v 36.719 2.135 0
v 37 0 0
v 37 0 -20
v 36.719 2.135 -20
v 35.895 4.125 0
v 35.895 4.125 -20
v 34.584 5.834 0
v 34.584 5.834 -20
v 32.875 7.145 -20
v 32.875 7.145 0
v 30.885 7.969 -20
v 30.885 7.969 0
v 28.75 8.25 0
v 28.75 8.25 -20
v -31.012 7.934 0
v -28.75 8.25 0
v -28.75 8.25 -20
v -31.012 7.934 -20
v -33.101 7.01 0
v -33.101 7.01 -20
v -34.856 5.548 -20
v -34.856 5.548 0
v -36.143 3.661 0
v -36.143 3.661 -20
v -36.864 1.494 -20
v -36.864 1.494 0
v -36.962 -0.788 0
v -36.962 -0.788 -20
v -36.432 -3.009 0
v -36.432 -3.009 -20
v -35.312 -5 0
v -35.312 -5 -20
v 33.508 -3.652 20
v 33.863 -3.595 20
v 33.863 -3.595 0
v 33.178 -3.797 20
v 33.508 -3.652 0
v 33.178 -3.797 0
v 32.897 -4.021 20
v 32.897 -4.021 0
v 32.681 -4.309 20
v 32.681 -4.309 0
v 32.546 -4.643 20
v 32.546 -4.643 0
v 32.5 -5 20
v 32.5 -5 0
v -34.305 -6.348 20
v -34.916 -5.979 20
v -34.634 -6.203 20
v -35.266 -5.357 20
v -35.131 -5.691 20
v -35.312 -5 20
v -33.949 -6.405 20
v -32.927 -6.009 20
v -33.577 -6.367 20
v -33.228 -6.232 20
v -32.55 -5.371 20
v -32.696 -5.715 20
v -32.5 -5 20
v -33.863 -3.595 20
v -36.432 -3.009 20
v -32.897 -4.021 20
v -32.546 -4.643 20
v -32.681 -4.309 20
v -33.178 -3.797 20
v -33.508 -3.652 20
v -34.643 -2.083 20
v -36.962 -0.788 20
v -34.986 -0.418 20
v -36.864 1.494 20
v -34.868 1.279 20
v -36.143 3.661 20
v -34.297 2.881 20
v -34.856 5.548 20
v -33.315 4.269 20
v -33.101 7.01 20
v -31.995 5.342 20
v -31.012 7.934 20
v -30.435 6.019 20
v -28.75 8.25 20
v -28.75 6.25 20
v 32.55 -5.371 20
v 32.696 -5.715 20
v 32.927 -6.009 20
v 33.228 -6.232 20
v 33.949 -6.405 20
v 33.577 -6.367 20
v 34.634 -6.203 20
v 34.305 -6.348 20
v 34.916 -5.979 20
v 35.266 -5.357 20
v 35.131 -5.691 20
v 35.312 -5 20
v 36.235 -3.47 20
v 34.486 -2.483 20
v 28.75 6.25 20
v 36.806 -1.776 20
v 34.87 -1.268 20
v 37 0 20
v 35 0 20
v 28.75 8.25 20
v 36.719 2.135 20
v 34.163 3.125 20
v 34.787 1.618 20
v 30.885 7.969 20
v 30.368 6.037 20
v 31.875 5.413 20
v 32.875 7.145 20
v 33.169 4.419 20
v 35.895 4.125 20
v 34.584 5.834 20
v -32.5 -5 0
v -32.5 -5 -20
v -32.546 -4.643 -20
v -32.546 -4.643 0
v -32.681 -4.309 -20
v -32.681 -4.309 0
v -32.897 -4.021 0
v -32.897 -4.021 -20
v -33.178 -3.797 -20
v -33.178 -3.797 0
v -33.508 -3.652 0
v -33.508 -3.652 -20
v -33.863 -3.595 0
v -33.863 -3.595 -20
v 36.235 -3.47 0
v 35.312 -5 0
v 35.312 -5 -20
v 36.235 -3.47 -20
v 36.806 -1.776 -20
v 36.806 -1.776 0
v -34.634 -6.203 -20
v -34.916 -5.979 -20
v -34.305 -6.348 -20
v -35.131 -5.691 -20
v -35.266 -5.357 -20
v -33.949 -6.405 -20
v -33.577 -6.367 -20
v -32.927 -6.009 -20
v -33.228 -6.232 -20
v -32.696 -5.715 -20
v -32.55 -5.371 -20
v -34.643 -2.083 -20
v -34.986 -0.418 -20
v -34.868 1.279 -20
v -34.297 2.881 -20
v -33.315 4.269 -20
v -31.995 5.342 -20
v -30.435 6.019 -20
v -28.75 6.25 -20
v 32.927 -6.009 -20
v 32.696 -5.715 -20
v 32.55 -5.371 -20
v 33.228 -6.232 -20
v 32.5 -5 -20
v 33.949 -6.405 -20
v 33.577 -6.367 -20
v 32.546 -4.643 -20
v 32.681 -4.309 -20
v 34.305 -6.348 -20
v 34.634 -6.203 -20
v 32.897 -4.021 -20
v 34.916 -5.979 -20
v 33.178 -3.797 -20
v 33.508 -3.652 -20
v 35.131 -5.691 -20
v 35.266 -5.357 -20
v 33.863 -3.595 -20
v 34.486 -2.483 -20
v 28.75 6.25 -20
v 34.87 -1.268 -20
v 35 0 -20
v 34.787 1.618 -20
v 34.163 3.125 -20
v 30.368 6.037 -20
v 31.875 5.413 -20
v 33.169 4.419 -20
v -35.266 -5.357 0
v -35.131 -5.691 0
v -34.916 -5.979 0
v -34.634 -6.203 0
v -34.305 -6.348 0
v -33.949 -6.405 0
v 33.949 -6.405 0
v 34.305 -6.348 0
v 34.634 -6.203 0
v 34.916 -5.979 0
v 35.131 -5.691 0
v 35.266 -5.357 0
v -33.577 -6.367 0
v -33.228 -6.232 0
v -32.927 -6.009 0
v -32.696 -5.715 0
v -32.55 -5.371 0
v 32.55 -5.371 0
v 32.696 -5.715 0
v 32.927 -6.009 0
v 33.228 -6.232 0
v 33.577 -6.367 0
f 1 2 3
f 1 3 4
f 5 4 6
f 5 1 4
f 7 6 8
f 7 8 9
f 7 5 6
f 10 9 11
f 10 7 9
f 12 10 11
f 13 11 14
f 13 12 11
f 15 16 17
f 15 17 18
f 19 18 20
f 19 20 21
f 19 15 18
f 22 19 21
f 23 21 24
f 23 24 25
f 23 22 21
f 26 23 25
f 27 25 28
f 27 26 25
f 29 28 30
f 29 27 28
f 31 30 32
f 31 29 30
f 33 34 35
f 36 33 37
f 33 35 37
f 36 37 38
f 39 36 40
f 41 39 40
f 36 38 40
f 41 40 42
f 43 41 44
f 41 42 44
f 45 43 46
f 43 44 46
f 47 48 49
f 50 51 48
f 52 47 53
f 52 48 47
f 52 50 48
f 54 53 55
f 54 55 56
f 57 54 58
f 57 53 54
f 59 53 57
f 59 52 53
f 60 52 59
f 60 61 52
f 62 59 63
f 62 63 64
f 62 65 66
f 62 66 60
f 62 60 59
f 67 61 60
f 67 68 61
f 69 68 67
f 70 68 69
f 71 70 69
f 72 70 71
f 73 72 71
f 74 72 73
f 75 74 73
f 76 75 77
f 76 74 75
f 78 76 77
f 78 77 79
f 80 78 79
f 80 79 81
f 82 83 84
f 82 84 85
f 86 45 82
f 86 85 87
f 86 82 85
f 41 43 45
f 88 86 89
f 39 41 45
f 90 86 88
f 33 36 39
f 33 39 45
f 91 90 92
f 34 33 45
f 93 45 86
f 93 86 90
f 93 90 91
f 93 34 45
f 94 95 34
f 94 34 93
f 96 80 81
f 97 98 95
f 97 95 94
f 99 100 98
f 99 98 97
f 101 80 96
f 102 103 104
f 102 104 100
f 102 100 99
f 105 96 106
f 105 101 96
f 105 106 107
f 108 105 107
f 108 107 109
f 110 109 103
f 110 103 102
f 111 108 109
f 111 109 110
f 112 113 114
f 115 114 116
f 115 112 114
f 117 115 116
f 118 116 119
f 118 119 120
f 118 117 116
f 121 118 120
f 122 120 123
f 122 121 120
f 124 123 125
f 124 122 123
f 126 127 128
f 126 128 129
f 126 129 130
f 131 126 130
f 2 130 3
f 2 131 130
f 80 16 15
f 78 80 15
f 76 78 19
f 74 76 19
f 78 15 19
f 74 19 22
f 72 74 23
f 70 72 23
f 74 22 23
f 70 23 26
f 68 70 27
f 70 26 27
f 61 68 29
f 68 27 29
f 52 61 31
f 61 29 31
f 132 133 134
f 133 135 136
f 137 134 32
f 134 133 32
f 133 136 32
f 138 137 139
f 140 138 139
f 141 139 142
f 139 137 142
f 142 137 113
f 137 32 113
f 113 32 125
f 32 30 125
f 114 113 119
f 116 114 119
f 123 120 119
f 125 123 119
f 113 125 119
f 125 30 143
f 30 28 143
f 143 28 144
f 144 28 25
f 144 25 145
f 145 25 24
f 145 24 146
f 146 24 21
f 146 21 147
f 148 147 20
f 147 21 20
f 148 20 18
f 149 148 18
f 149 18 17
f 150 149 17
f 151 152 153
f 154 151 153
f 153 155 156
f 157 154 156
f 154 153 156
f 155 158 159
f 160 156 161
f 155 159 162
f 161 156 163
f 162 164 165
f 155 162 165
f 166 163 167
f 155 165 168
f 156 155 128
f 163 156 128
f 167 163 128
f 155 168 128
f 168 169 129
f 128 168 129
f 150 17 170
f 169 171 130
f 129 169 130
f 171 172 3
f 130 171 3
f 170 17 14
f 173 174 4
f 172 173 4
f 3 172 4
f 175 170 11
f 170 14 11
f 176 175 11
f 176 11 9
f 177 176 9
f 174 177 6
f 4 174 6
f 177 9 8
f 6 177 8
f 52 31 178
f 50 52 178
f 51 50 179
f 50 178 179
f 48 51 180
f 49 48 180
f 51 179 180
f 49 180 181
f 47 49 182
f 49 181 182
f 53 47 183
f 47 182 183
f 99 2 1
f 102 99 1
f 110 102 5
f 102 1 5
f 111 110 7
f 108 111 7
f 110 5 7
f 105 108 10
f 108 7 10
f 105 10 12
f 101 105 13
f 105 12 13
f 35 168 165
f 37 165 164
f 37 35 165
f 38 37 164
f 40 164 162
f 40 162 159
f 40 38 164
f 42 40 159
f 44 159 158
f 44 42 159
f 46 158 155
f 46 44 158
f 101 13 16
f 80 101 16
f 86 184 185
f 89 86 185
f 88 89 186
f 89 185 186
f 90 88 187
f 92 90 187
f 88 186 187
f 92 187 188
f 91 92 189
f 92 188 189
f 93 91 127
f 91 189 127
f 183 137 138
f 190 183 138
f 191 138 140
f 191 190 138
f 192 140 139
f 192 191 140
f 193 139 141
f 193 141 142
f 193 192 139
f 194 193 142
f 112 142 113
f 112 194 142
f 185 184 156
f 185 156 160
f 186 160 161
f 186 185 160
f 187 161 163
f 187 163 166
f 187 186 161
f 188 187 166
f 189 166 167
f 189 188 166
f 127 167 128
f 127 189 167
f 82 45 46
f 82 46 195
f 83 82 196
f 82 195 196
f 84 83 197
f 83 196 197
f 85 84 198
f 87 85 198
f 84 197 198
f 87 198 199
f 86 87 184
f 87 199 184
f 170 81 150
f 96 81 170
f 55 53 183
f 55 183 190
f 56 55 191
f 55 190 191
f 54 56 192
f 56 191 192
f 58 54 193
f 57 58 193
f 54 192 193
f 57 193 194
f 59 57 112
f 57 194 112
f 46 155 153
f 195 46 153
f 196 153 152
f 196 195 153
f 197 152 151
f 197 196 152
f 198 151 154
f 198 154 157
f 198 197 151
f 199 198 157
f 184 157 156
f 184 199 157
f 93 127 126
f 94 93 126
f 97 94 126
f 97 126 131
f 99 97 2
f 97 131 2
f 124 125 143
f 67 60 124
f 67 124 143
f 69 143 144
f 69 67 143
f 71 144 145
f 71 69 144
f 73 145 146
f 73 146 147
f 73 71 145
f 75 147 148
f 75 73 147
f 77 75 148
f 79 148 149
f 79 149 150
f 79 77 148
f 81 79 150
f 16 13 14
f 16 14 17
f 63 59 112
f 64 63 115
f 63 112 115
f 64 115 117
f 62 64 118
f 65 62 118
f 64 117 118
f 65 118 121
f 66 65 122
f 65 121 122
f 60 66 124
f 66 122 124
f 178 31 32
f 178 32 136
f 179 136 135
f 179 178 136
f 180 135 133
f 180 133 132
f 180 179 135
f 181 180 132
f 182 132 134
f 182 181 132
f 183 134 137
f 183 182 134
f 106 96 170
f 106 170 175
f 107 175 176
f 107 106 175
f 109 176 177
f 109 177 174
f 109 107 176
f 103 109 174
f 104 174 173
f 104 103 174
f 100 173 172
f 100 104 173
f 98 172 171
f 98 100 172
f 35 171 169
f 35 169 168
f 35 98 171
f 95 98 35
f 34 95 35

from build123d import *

# Parameters (mm, degrees)
F1_DEPTH = 20


with BuildPart() as f1:
    # F0 (on Top) → F1 (new body, symmetric)
    with BuildSketch(Plane.XY):
        with BuildLine():
            Line((-28.75, 8.25), (-28.75, 6.25))
            Line((-28.75, 6.25), (-23.3648351929, 6.25))
            ThreePointArc((-23.3648351929, 6.25), (-25.8777186767, 7.7338541491), (-28.75, 8.25))
        make_face()
        with BuildLine():
            ThreePointArc((-33.8628873162, -3.5945630182), (-34.2965538339, 2.8806666881), (-28.75, 6.25))
            Line((-28.75, 6.25), (-28.75, 8.25))
            ThreePointArc((-28.75, 8.25), (-36.1429865413, 3.661454629), (-35.3122023742, -5))
            ThreePointArc((-35.3122023742, -5), (-34.8849672334, -3.9905735233), (-33.8628873162, -3.5945630182))
        make_face()
        with BuildLine():
            ThreePointArc((-28.75, 8.25), (-25.8777186767, 7.7338541491), (-23.3648351929, 6.25))
            Line((-23.3648351929, 6.25), (23.3648351929, 6.25))
            ThreePointArc((23.3648351929, 6.25), (25.8777186767, 7.7338541491), (28.75, 8.25))
            Line((28.75, 8.25), (-28.75, 8.25))
        make_face()
        with BuildLine():
            ThreePointArc((-32.5, -5), (-32.8966747104, -4.0211339537), (-33.8628873162, -3.5945630182))
            ThreePointArc((-33.8628873162, -3.5945630182), (-33.2368147022, -4.3509761925), (-32.5, -5))
        make_face()
        with BuildLine():
            ThreePointArc((-32.5, -5), (-33.2368147022, -4.3509761925), (-33.8628873162, -3.5945630182))
            ThreePointArc((-33.8628873162, -3.5945630182), (-34.8849672334, -3.9905735233), (-35.3122023742, -5))
            Line((-35.3122023742, -5), (-32.5, -5))
        make_face()
        with BuildLine():
            ThreePointArc((28.75, 8.25), (25.8777186767, 7.7338541491), (23.3648351929, 6.25))
            Line((23.3648351929, 6.25), (28.75, 6.25))
            Line((28.75, 6.25), (28.75, 8.25))
        make_face()
        with BuildLine():
            ThreePointArc((-33.949315058, -6.4054369818), (-32.9272351408, -6.0094264767), (-32.5, -5))
            Line((-32.5, -5), (-35.3122023742, -5))
            ThreePointArc((-35.3122023742, -5), (-34.672595407, -5.7432885741), (-33.949315058, -6.4054369818))
        make_face()
        with BuildLine():
            ThreePointArc((37, 0), (34.5836309448, 5.8336309448), (28.75, 8.25))
            Line((28.75, 8.25), (28.75, 6.25))
            ThreePointArc((28.75, 6.25), (33.1694173824, 4.4194173824), (35, 0))
            ThreePointArc((35, 0), (34.7089447776, -1.8850668786), (33.8628873162, -3.5945630182))
            ThreePointArc((33.8628873162, -3.5945630182), (34.8849672334, -3.9905735233), (35.3122023742, -5))
            ThreePointArc((35.3122023742, -5), (36.5666703137, -2.6385915194), (37, 0))
        make_face()
        with BuildLine():
            ThreePointArc((-33.949315058, -6.4054369818), (-34.672595407, -5.7432885741), (-35.3122023742, -5))
            ThreePointArc((-35.3122023742, -5), (-34.9155276638, -5.9788660463), (-33.949315058, -6.4054369818))
        make_face()
        with BuildLine():
            ThreePointArc((33.949315058, -6.4054369818), (34.9155276638, -5.9788660463), (35.3122023742, -5))
            ThreePointArc((35.3122023742, -5), (34.672595407, -5.7432885741), (33.949315058, -6.4054369818))
        make_face()
        with BuildLine():
            ThreePointArc((33.949315058, -6.4054369818), (34.672595407, -5.7432885741), (35.3122023742, -5))
            Line((35.3122023742, -5), (32.5, -5))
            ThreePointArc((32.5, -5), (32.9272351408, -6.0094264767), (33.949315058, -6.4054369818))
        make_face()
        with BuildLine():
            Line((32.5, -5), (35.3122023742, -5))
            ThreePointArc((35.3122023742, -5), (34.8849672334, -3.9905735233), (33.8628873162, -3.5945630182))
            ThreePointArc((33.8628873162, -3.5945630182), (33.2368147022, -4.3509761925), (32.5, -5))
        make_face()
        with BuildLine():
            ThreePointArc((33.8628873162, -3.5945630182), (32.8966747104, -4.0211339537), (32.5, -5))
            ThreePointArc((32.5, -5), (33.2368147022, -4.3509761925), (33.8628873162, -3.5945630182))
        make_face()
    extrude(amount=F1_DEPTH, both=True)


solid = f1.part
